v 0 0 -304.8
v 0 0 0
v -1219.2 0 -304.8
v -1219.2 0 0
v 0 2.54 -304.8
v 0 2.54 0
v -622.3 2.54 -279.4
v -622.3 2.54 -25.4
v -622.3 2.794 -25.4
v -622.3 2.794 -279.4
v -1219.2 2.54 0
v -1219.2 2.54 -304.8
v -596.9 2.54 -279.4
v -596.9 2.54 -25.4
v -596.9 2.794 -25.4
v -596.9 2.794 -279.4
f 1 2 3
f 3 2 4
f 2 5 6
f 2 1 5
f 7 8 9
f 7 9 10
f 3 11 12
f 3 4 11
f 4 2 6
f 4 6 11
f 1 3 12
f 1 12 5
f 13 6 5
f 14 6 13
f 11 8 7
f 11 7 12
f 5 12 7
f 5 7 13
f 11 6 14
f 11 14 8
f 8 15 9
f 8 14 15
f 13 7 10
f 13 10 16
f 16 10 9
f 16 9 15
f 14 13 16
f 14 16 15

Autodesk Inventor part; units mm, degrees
ref_plane "YZ Plane" through (0, 0, 0) normal (1, 0, 0) x (0, 1, 0)
ref_plane "XZ Plane" through (0, 0, 0) normal (0, 1, 0) x (-1, 0, 0)
ref_plane "XY Plane" through (0, 0, 0) normal (0, 0, 1) x (1, 0, 0)
sketch "Sketch1" plane through (0, 0, 0) normal (0, 1, 0) x (-1, 0, 0)
  line L0 (0, 0) -> (1219.2, 0)
  line L1 (1219.2, 0) -> (1219.2, -304.8)
  line L2 (1219.2, -304.8) -> (0, -304.8)
  line L3 (0, -304.8) -> (0, 0)
  dimension "d0" = 1219.2
  dimension "d1" = 304.8
extrude "Extrusion1" add sketch "Sketch1" along normal blind 2.54
sketch "Sketch2" plane through (0, 2.54, 0) normal (0, 1, 0) x (1, 0, 0)
  line L0 (-622.3, 279.4) -> (-596.9, 279.4)
  line L1 (-596.9, 279.4) -> (-596.9, 25.4)
  line L2 (-596.9, 25.4) -> (-622.3, 25.4)
  line L3 (-622.3, 25.4) -> (-622.3, 279.4)
  line L4 (-609.6, 791.1574) -> (-609.6, -567.1744) construction
  line L5 (0, 0) -> (0, 304.8) projected
  line L6 (0, 304.8) -> (-1219.2, 304.8) projected
  dimension "d4" = 254
  dimension "d5" = 25.4
  dimension "d6" = 609.6
  dimension "d7" = 12.7
  dimension "d8" = 25.4
extrude "Extrusion2" add sketch "Sketch2" along normal blind 0.254
equation "\"d7\" = 0.5 * d5"
equation "\"d8\" = d5"
properties part number "black_mid_empty"
